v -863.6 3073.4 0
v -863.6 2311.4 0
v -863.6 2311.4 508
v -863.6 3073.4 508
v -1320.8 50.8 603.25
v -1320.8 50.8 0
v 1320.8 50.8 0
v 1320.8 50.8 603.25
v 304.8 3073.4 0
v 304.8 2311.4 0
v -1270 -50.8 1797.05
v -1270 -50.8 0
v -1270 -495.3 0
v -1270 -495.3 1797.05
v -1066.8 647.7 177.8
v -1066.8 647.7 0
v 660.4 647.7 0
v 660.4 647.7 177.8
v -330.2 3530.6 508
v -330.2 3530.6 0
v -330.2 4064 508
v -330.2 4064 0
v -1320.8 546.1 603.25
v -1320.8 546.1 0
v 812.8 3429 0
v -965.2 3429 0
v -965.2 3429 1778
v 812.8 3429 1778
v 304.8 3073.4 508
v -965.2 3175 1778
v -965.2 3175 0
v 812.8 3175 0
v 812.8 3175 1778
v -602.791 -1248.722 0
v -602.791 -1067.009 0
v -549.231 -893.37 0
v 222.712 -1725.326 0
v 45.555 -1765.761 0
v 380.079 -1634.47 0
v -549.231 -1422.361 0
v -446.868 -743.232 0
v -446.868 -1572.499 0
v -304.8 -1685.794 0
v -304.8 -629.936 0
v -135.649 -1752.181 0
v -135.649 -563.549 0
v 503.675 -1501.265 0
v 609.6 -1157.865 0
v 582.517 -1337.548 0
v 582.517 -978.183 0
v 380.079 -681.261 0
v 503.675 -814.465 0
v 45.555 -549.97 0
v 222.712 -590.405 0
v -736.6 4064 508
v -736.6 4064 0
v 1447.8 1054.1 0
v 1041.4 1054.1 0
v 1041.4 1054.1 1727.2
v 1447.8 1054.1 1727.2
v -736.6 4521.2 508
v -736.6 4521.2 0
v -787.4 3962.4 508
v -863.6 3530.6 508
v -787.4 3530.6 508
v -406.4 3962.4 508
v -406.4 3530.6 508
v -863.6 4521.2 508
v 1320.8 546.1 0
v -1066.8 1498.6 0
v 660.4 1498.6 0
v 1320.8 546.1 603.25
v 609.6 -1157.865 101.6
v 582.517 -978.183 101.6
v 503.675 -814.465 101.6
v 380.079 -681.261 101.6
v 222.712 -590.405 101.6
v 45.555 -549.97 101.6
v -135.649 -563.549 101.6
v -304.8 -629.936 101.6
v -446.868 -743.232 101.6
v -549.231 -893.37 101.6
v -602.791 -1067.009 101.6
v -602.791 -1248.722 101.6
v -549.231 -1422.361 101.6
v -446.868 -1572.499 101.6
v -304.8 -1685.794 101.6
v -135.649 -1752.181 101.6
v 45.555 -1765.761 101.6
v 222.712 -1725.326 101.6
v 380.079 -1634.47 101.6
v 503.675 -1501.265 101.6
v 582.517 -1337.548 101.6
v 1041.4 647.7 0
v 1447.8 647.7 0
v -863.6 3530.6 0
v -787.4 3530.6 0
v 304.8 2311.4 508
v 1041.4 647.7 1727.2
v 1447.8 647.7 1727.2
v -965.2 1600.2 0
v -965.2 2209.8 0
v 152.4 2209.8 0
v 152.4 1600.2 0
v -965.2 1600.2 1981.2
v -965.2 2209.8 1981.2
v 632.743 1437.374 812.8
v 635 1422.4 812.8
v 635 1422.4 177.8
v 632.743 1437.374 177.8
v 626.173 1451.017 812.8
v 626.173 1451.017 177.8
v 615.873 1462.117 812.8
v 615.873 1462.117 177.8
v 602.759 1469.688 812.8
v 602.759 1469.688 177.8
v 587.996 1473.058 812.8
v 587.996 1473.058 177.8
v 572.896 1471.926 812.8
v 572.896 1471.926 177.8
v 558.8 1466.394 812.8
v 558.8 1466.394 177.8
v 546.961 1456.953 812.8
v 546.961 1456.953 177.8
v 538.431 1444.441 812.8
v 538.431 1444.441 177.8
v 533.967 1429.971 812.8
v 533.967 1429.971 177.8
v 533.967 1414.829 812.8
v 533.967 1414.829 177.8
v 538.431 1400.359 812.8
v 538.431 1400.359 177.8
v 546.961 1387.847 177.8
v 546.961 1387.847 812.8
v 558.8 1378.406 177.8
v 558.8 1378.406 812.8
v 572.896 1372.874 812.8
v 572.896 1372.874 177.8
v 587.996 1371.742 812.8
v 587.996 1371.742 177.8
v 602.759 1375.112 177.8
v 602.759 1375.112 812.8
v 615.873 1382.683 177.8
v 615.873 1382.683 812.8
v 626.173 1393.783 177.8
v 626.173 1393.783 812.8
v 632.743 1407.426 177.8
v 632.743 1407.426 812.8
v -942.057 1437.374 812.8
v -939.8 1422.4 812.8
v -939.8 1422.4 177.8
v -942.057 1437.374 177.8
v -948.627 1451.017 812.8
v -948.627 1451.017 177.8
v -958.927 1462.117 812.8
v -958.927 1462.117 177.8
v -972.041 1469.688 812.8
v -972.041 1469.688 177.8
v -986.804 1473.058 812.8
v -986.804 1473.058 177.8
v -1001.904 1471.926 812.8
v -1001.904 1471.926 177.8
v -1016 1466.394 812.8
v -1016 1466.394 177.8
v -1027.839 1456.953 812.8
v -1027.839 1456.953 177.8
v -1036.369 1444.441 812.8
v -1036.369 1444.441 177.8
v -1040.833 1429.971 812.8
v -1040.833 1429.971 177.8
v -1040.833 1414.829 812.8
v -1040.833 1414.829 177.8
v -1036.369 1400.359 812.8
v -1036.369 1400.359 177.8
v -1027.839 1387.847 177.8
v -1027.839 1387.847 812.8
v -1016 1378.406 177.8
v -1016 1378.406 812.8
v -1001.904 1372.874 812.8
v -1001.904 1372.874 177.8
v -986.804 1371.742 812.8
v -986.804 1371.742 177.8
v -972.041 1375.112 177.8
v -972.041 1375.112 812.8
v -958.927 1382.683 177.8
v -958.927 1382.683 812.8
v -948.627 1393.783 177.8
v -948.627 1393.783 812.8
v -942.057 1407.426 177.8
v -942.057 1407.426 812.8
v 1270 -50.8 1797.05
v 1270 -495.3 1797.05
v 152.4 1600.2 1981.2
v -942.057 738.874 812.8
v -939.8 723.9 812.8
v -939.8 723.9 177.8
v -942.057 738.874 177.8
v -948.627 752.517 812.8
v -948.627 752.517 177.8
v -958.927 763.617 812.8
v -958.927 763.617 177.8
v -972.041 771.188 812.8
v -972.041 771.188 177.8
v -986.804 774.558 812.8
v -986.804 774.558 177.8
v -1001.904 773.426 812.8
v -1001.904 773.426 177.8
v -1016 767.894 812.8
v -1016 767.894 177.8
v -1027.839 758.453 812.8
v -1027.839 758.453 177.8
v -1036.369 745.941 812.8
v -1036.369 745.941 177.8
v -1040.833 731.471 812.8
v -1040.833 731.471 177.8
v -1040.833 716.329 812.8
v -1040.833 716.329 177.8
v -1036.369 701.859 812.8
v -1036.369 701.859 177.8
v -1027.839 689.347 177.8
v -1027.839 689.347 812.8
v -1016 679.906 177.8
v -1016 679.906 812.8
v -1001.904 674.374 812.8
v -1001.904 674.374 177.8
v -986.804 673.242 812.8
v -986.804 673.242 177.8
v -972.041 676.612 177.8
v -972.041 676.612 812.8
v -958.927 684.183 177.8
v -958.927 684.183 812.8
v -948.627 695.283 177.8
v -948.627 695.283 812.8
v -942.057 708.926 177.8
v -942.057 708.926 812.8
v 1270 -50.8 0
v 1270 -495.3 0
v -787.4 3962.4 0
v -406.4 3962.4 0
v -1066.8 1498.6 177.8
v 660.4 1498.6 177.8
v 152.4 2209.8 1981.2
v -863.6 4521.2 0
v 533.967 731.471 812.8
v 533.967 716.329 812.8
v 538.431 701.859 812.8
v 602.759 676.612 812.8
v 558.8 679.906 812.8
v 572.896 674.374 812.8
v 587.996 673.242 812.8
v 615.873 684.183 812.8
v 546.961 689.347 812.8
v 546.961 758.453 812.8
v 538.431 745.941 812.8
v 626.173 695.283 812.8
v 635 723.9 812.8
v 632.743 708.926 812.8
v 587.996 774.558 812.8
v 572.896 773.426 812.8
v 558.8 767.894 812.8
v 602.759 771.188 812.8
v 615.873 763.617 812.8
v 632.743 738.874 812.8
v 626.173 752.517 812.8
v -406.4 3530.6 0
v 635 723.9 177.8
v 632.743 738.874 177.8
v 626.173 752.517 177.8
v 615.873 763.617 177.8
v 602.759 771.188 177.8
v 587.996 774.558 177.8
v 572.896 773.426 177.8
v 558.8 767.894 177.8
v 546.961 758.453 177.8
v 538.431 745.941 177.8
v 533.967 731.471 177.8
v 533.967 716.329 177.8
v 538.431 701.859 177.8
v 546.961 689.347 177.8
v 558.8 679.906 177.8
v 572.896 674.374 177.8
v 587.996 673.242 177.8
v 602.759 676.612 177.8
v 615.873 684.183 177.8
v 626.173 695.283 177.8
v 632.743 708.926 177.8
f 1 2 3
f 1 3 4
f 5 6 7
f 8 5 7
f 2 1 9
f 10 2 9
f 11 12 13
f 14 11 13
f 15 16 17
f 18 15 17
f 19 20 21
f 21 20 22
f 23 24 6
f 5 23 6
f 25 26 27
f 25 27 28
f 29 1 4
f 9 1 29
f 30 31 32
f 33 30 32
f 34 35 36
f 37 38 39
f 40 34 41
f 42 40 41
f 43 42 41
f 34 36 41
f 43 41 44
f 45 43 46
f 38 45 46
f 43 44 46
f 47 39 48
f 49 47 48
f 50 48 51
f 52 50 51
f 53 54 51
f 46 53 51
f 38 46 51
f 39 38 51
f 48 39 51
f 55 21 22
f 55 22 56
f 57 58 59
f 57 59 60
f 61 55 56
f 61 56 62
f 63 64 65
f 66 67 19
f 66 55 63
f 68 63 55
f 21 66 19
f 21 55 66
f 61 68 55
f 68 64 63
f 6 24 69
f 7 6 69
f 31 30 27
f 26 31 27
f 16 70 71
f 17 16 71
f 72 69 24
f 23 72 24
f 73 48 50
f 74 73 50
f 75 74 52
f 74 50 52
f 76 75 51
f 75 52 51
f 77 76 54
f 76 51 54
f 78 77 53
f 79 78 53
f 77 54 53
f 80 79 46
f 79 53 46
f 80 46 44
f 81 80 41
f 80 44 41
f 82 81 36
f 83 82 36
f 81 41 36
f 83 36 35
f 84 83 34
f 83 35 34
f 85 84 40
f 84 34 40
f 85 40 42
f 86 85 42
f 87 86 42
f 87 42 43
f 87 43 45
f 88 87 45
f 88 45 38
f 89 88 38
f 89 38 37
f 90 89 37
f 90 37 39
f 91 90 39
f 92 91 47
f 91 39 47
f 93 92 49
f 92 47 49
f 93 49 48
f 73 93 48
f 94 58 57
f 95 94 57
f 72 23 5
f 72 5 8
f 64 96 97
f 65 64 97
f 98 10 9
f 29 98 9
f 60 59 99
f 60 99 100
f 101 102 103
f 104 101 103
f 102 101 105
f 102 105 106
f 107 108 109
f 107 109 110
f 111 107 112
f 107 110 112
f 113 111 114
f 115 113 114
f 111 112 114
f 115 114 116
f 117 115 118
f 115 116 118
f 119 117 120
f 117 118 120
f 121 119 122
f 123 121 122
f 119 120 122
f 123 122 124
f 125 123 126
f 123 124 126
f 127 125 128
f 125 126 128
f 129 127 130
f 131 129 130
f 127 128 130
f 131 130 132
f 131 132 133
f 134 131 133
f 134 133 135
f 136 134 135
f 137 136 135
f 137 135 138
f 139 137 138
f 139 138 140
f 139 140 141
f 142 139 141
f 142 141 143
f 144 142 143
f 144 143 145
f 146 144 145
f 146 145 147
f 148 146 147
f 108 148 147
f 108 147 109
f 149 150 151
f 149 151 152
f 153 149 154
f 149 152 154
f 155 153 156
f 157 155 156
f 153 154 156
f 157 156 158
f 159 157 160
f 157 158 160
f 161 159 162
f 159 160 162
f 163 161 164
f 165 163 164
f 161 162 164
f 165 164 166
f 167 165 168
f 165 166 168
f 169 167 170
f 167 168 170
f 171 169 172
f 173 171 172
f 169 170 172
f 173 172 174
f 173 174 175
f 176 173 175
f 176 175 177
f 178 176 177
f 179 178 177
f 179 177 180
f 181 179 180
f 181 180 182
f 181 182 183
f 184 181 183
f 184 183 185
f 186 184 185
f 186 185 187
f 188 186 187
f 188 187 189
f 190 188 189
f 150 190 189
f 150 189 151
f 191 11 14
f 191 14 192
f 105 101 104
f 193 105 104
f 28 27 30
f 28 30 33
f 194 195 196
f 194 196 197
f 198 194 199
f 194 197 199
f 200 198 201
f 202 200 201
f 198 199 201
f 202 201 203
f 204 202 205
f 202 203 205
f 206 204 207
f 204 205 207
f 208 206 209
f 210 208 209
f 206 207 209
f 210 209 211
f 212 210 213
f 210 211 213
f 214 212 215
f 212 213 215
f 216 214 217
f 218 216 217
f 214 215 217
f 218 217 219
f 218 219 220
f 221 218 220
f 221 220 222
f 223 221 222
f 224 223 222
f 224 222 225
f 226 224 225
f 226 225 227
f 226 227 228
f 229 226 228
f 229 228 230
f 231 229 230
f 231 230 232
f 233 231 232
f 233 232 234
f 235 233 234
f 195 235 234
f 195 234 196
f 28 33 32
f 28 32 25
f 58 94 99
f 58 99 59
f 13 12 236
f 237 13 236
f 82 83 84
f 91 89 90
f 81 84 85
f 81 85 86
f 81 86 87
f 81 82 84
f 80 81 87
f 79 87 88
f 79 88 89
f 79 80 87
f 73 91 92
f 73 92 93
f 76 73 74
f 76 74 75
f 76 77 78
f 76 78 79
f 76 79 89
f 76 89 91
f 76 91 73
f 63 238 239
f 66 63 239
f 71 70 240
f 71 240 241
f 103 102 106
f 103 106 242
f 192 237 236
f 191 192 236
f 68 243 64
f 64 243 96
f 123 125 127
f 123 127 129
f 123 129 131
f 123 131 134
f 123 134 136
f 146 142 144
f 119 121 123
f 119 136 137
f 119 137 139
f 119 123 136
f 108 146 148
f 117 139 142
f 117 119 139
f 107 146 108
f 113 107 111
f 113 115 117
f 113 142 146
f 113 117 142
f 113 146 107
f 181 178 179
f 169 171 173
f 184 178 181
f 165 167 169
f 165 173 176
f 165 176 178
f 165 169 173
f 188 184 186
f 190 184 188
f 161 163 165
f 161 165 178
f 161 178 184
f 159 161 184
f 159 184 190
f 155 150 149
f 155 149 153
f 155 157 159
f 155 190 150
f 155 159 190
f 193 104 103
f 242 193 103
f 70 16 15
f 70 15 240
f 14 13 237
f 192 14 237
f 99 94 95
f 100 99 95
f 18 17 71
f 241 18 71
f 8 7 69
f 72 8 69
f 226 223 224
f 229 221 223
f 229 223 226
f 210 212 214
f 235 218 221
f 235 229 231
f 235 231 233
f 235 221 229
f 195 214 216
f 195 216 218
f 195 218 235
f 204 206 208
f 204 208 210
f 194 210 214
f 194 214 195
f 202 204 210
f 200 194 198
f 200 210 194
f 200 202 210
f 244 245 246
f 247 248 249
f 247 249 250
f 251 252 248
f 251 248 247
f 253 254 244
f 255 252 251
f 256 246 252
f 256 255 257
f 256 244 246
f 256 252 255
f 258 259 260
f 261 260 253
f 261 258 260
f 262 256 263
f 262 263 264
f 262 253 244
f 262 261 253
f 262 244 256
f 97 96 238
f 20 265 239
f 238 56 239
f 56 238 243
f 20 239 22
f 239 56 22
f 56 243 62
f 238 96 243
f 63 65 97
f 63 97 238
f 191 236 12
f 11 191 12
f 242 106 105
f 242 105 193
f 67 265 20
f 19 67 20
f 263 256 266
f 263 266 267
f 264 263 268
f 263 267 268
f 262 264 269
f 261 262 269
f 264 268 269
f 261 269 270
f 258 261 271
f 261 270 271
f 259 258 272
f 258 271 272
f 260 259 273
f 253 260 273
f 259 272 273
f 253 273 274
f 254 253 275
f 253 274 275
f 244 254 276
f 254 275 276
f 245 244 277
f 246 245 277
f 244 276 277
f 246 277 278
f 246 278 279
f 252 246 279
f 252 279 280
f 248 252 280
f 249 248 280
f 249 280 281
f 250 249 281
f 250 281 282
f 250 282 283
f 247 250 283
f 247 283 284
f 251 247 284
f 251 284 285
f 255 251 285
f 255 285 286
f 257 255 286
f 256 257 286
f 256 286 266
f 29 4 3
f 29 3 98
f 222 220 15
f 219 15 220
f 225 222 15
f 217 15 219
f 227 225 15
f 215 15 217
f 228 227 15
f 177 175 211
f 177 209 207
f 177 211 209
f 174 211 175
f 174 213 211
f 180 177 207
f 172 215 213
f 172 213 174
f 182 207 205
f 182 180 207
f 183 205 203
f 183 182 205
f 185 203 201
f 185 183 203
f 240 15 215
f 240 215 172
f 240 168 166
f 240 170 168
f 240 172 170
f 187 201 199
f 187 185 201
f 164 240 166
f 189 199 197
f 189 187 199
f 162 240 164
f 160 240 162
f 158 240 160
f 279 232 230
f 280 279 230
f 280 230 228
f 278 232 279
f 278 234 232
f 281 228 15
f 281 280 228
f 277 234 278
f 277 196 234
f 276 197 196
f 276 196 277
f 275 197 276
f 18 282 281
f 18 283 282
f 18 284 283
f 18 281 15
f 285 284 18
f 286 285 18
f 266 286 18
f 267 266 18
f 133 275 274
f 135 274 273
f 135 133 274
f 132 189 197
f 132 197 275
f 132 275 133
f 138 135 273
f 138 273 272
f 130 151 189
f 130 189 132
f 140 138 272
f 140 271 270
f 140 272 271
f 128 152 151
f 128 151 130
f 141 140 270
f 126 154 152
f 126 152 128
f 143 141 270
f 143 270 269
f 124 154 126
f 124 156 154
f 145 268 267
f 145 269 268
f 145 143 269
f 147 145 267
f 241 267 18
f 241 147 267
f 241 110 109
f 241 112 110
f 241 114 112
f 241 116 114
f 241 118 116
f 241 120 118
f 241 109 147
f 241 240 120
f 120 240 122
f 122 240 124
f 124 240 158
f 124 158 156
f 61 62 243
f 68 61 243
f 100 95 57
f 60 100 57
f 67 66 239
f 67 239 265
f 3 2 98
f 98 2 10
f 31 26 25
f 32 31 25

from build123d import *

# Parameters (mm, degrees)
F1_DEPTH  = 603.25
F2_DEPTH  = 1797.05
F0_W      = 1727.2
F0_H      = 850.9
F0_R      = 50.8
F3_DEPTH  = 177.8
F4_DEPTH  = 812.8
F0_W_2    = 1117.6
F0_H_2    = 609.6
F5_DEPTH  = 1981.2
F0_W_3    = 1168.4
F0_H_3    = 762
F6_DEPTH  = 508
F0_W_4    = 1778
F0_H_4    = 254
F7_DEPTH  = 1778
F8_DEPTH  = 508
F0_W_5    = 406.4
F0_H_5    = 406.4
F9_DEPTH  = 1727.2
F0_R_2    = 609.6
F10_DEPTH = 101.6


with BuildPart() as f1:
    # F0 (on Top) → F1 (new body)
    with BuildSketch(Plane.XY):
        Polygon((-1320.8, 546.1), (-1320.8, 50.8), (0, 50.8), (1320.8, 50.8), (1320.8, 546.1), align=None)
    extrude(amount=F1_DEPTH)


with BuildPart() as f2:
    # F0 (on Top) → F2 (new body)
    with BuildSketch(Plane.XY):
        Polygon((1270, -50.8), (0, -50.8), (-1270, -50.8), (-1270, -495.3), (1270, -495.3), align=None)
    extrude(amount=F2_DEPTH)


with BuildPart() as f3:
    # F0 (on Top) → F3 (new body)
    with BuildSketch(Plane.XY):
        with Locations((-203.2, 1073.15)):
            Rectangle(F0_W, F0_H)
        with Locations((-990.6, 723.9)):
            Circle(F0_R, mode=Mode.SUBTRACT)
        with Locations((584.2, 723.9)):
            Circle(F0_R, mode=Mode.SUBTRACT)
        with Locations((-990.6, 1422.4)):
            Circle(F0_R, mode=Mode.SUBTRACT)
        with Locations((584.2, 1422.4)):
            Circle(F0_R, mode=Mode.SUBTRACT)
    extrude(amount=F3_DEPTH)

    # F0 (on Top) → F4 (join)
    with BuildSketch(Plane.XY):
        with Locations((-990.6, 1422.4)):
            Circle(F0_R)
        with Locations((584.2, 1422.4)):
            Circle(F0_R)
        with Locations((-990.6, 723.9)):
            Circle(F0_R)
        with Locations((584.2, 723.9)):
            Circle(F0_R)
    extrude(amount=F4_DEPTH)


with BuildPart() as f5:
    # F0 (on Top) → F5 (new body)
    with BuildSketch(Plane.XY):
        with Locations((-406.4, 1905)):
            Rectangle(F0_W_2, F0_H_2)
    extrude(amount=F5_DEPTH)


with BuildPart() as f6:
    # F0 (on Top) → F6 (new body)
    with BuildSketch(Plane.XY):
        with Locations((-279.4, 2692.4)):
            Rectangle(F0_W_3, F0_H_3)
    extrude(amount=F6_DEPTH)


with BuildPart() as f7:
    # F0 (on Top) → F7 (new body)
    with BuildSketch(Plane.XY):
        with Locations((-76.2, 3302)):
            Rectangle(F0_W_4, F0_H_4)
    extrude(amount=F7_DEPTH)


with BuildPart() as f8:
    # F0 (on Top) → F8 (new body)
    with BuildSketch(Plane.XY):
        Polygon((-863.6, 4521.2), (-863.6, 3530.6), (-787.4, 3530.6), (-787.4, 3962.4), (-406.4, 3962.4), (-406.4, 3530.6), (-330.2, 3530.6), (-330.2, 4064), (-736.6, 4064), (-736.6, 4521.2), align=None)
    extrude(amount=F8_DEPTH)


with BuildPart() as f9:
    # F0 (on Top) → F9 (new body)
    with BuildSketch(Plane.XY):
        with Locations((1244.6, 850.9)):
            Rectangle(F0_W_5, F0_H_5)
    extrude(amount=F9_DEPTH)


with BuildPart() as f10:
    # F0 (on Top) → F10 (new body)
    with BuildSketch(Plane.XY):
        with Locations((0, -1157.865405)):
            Circle(F0_R_2)
    extrude(amount=F10_DEPTH)


solid = Compound([f1.part, f2.part, f3.part, f5.part, f6.part, f7.part, f8.part, f9.part, f10.part])
